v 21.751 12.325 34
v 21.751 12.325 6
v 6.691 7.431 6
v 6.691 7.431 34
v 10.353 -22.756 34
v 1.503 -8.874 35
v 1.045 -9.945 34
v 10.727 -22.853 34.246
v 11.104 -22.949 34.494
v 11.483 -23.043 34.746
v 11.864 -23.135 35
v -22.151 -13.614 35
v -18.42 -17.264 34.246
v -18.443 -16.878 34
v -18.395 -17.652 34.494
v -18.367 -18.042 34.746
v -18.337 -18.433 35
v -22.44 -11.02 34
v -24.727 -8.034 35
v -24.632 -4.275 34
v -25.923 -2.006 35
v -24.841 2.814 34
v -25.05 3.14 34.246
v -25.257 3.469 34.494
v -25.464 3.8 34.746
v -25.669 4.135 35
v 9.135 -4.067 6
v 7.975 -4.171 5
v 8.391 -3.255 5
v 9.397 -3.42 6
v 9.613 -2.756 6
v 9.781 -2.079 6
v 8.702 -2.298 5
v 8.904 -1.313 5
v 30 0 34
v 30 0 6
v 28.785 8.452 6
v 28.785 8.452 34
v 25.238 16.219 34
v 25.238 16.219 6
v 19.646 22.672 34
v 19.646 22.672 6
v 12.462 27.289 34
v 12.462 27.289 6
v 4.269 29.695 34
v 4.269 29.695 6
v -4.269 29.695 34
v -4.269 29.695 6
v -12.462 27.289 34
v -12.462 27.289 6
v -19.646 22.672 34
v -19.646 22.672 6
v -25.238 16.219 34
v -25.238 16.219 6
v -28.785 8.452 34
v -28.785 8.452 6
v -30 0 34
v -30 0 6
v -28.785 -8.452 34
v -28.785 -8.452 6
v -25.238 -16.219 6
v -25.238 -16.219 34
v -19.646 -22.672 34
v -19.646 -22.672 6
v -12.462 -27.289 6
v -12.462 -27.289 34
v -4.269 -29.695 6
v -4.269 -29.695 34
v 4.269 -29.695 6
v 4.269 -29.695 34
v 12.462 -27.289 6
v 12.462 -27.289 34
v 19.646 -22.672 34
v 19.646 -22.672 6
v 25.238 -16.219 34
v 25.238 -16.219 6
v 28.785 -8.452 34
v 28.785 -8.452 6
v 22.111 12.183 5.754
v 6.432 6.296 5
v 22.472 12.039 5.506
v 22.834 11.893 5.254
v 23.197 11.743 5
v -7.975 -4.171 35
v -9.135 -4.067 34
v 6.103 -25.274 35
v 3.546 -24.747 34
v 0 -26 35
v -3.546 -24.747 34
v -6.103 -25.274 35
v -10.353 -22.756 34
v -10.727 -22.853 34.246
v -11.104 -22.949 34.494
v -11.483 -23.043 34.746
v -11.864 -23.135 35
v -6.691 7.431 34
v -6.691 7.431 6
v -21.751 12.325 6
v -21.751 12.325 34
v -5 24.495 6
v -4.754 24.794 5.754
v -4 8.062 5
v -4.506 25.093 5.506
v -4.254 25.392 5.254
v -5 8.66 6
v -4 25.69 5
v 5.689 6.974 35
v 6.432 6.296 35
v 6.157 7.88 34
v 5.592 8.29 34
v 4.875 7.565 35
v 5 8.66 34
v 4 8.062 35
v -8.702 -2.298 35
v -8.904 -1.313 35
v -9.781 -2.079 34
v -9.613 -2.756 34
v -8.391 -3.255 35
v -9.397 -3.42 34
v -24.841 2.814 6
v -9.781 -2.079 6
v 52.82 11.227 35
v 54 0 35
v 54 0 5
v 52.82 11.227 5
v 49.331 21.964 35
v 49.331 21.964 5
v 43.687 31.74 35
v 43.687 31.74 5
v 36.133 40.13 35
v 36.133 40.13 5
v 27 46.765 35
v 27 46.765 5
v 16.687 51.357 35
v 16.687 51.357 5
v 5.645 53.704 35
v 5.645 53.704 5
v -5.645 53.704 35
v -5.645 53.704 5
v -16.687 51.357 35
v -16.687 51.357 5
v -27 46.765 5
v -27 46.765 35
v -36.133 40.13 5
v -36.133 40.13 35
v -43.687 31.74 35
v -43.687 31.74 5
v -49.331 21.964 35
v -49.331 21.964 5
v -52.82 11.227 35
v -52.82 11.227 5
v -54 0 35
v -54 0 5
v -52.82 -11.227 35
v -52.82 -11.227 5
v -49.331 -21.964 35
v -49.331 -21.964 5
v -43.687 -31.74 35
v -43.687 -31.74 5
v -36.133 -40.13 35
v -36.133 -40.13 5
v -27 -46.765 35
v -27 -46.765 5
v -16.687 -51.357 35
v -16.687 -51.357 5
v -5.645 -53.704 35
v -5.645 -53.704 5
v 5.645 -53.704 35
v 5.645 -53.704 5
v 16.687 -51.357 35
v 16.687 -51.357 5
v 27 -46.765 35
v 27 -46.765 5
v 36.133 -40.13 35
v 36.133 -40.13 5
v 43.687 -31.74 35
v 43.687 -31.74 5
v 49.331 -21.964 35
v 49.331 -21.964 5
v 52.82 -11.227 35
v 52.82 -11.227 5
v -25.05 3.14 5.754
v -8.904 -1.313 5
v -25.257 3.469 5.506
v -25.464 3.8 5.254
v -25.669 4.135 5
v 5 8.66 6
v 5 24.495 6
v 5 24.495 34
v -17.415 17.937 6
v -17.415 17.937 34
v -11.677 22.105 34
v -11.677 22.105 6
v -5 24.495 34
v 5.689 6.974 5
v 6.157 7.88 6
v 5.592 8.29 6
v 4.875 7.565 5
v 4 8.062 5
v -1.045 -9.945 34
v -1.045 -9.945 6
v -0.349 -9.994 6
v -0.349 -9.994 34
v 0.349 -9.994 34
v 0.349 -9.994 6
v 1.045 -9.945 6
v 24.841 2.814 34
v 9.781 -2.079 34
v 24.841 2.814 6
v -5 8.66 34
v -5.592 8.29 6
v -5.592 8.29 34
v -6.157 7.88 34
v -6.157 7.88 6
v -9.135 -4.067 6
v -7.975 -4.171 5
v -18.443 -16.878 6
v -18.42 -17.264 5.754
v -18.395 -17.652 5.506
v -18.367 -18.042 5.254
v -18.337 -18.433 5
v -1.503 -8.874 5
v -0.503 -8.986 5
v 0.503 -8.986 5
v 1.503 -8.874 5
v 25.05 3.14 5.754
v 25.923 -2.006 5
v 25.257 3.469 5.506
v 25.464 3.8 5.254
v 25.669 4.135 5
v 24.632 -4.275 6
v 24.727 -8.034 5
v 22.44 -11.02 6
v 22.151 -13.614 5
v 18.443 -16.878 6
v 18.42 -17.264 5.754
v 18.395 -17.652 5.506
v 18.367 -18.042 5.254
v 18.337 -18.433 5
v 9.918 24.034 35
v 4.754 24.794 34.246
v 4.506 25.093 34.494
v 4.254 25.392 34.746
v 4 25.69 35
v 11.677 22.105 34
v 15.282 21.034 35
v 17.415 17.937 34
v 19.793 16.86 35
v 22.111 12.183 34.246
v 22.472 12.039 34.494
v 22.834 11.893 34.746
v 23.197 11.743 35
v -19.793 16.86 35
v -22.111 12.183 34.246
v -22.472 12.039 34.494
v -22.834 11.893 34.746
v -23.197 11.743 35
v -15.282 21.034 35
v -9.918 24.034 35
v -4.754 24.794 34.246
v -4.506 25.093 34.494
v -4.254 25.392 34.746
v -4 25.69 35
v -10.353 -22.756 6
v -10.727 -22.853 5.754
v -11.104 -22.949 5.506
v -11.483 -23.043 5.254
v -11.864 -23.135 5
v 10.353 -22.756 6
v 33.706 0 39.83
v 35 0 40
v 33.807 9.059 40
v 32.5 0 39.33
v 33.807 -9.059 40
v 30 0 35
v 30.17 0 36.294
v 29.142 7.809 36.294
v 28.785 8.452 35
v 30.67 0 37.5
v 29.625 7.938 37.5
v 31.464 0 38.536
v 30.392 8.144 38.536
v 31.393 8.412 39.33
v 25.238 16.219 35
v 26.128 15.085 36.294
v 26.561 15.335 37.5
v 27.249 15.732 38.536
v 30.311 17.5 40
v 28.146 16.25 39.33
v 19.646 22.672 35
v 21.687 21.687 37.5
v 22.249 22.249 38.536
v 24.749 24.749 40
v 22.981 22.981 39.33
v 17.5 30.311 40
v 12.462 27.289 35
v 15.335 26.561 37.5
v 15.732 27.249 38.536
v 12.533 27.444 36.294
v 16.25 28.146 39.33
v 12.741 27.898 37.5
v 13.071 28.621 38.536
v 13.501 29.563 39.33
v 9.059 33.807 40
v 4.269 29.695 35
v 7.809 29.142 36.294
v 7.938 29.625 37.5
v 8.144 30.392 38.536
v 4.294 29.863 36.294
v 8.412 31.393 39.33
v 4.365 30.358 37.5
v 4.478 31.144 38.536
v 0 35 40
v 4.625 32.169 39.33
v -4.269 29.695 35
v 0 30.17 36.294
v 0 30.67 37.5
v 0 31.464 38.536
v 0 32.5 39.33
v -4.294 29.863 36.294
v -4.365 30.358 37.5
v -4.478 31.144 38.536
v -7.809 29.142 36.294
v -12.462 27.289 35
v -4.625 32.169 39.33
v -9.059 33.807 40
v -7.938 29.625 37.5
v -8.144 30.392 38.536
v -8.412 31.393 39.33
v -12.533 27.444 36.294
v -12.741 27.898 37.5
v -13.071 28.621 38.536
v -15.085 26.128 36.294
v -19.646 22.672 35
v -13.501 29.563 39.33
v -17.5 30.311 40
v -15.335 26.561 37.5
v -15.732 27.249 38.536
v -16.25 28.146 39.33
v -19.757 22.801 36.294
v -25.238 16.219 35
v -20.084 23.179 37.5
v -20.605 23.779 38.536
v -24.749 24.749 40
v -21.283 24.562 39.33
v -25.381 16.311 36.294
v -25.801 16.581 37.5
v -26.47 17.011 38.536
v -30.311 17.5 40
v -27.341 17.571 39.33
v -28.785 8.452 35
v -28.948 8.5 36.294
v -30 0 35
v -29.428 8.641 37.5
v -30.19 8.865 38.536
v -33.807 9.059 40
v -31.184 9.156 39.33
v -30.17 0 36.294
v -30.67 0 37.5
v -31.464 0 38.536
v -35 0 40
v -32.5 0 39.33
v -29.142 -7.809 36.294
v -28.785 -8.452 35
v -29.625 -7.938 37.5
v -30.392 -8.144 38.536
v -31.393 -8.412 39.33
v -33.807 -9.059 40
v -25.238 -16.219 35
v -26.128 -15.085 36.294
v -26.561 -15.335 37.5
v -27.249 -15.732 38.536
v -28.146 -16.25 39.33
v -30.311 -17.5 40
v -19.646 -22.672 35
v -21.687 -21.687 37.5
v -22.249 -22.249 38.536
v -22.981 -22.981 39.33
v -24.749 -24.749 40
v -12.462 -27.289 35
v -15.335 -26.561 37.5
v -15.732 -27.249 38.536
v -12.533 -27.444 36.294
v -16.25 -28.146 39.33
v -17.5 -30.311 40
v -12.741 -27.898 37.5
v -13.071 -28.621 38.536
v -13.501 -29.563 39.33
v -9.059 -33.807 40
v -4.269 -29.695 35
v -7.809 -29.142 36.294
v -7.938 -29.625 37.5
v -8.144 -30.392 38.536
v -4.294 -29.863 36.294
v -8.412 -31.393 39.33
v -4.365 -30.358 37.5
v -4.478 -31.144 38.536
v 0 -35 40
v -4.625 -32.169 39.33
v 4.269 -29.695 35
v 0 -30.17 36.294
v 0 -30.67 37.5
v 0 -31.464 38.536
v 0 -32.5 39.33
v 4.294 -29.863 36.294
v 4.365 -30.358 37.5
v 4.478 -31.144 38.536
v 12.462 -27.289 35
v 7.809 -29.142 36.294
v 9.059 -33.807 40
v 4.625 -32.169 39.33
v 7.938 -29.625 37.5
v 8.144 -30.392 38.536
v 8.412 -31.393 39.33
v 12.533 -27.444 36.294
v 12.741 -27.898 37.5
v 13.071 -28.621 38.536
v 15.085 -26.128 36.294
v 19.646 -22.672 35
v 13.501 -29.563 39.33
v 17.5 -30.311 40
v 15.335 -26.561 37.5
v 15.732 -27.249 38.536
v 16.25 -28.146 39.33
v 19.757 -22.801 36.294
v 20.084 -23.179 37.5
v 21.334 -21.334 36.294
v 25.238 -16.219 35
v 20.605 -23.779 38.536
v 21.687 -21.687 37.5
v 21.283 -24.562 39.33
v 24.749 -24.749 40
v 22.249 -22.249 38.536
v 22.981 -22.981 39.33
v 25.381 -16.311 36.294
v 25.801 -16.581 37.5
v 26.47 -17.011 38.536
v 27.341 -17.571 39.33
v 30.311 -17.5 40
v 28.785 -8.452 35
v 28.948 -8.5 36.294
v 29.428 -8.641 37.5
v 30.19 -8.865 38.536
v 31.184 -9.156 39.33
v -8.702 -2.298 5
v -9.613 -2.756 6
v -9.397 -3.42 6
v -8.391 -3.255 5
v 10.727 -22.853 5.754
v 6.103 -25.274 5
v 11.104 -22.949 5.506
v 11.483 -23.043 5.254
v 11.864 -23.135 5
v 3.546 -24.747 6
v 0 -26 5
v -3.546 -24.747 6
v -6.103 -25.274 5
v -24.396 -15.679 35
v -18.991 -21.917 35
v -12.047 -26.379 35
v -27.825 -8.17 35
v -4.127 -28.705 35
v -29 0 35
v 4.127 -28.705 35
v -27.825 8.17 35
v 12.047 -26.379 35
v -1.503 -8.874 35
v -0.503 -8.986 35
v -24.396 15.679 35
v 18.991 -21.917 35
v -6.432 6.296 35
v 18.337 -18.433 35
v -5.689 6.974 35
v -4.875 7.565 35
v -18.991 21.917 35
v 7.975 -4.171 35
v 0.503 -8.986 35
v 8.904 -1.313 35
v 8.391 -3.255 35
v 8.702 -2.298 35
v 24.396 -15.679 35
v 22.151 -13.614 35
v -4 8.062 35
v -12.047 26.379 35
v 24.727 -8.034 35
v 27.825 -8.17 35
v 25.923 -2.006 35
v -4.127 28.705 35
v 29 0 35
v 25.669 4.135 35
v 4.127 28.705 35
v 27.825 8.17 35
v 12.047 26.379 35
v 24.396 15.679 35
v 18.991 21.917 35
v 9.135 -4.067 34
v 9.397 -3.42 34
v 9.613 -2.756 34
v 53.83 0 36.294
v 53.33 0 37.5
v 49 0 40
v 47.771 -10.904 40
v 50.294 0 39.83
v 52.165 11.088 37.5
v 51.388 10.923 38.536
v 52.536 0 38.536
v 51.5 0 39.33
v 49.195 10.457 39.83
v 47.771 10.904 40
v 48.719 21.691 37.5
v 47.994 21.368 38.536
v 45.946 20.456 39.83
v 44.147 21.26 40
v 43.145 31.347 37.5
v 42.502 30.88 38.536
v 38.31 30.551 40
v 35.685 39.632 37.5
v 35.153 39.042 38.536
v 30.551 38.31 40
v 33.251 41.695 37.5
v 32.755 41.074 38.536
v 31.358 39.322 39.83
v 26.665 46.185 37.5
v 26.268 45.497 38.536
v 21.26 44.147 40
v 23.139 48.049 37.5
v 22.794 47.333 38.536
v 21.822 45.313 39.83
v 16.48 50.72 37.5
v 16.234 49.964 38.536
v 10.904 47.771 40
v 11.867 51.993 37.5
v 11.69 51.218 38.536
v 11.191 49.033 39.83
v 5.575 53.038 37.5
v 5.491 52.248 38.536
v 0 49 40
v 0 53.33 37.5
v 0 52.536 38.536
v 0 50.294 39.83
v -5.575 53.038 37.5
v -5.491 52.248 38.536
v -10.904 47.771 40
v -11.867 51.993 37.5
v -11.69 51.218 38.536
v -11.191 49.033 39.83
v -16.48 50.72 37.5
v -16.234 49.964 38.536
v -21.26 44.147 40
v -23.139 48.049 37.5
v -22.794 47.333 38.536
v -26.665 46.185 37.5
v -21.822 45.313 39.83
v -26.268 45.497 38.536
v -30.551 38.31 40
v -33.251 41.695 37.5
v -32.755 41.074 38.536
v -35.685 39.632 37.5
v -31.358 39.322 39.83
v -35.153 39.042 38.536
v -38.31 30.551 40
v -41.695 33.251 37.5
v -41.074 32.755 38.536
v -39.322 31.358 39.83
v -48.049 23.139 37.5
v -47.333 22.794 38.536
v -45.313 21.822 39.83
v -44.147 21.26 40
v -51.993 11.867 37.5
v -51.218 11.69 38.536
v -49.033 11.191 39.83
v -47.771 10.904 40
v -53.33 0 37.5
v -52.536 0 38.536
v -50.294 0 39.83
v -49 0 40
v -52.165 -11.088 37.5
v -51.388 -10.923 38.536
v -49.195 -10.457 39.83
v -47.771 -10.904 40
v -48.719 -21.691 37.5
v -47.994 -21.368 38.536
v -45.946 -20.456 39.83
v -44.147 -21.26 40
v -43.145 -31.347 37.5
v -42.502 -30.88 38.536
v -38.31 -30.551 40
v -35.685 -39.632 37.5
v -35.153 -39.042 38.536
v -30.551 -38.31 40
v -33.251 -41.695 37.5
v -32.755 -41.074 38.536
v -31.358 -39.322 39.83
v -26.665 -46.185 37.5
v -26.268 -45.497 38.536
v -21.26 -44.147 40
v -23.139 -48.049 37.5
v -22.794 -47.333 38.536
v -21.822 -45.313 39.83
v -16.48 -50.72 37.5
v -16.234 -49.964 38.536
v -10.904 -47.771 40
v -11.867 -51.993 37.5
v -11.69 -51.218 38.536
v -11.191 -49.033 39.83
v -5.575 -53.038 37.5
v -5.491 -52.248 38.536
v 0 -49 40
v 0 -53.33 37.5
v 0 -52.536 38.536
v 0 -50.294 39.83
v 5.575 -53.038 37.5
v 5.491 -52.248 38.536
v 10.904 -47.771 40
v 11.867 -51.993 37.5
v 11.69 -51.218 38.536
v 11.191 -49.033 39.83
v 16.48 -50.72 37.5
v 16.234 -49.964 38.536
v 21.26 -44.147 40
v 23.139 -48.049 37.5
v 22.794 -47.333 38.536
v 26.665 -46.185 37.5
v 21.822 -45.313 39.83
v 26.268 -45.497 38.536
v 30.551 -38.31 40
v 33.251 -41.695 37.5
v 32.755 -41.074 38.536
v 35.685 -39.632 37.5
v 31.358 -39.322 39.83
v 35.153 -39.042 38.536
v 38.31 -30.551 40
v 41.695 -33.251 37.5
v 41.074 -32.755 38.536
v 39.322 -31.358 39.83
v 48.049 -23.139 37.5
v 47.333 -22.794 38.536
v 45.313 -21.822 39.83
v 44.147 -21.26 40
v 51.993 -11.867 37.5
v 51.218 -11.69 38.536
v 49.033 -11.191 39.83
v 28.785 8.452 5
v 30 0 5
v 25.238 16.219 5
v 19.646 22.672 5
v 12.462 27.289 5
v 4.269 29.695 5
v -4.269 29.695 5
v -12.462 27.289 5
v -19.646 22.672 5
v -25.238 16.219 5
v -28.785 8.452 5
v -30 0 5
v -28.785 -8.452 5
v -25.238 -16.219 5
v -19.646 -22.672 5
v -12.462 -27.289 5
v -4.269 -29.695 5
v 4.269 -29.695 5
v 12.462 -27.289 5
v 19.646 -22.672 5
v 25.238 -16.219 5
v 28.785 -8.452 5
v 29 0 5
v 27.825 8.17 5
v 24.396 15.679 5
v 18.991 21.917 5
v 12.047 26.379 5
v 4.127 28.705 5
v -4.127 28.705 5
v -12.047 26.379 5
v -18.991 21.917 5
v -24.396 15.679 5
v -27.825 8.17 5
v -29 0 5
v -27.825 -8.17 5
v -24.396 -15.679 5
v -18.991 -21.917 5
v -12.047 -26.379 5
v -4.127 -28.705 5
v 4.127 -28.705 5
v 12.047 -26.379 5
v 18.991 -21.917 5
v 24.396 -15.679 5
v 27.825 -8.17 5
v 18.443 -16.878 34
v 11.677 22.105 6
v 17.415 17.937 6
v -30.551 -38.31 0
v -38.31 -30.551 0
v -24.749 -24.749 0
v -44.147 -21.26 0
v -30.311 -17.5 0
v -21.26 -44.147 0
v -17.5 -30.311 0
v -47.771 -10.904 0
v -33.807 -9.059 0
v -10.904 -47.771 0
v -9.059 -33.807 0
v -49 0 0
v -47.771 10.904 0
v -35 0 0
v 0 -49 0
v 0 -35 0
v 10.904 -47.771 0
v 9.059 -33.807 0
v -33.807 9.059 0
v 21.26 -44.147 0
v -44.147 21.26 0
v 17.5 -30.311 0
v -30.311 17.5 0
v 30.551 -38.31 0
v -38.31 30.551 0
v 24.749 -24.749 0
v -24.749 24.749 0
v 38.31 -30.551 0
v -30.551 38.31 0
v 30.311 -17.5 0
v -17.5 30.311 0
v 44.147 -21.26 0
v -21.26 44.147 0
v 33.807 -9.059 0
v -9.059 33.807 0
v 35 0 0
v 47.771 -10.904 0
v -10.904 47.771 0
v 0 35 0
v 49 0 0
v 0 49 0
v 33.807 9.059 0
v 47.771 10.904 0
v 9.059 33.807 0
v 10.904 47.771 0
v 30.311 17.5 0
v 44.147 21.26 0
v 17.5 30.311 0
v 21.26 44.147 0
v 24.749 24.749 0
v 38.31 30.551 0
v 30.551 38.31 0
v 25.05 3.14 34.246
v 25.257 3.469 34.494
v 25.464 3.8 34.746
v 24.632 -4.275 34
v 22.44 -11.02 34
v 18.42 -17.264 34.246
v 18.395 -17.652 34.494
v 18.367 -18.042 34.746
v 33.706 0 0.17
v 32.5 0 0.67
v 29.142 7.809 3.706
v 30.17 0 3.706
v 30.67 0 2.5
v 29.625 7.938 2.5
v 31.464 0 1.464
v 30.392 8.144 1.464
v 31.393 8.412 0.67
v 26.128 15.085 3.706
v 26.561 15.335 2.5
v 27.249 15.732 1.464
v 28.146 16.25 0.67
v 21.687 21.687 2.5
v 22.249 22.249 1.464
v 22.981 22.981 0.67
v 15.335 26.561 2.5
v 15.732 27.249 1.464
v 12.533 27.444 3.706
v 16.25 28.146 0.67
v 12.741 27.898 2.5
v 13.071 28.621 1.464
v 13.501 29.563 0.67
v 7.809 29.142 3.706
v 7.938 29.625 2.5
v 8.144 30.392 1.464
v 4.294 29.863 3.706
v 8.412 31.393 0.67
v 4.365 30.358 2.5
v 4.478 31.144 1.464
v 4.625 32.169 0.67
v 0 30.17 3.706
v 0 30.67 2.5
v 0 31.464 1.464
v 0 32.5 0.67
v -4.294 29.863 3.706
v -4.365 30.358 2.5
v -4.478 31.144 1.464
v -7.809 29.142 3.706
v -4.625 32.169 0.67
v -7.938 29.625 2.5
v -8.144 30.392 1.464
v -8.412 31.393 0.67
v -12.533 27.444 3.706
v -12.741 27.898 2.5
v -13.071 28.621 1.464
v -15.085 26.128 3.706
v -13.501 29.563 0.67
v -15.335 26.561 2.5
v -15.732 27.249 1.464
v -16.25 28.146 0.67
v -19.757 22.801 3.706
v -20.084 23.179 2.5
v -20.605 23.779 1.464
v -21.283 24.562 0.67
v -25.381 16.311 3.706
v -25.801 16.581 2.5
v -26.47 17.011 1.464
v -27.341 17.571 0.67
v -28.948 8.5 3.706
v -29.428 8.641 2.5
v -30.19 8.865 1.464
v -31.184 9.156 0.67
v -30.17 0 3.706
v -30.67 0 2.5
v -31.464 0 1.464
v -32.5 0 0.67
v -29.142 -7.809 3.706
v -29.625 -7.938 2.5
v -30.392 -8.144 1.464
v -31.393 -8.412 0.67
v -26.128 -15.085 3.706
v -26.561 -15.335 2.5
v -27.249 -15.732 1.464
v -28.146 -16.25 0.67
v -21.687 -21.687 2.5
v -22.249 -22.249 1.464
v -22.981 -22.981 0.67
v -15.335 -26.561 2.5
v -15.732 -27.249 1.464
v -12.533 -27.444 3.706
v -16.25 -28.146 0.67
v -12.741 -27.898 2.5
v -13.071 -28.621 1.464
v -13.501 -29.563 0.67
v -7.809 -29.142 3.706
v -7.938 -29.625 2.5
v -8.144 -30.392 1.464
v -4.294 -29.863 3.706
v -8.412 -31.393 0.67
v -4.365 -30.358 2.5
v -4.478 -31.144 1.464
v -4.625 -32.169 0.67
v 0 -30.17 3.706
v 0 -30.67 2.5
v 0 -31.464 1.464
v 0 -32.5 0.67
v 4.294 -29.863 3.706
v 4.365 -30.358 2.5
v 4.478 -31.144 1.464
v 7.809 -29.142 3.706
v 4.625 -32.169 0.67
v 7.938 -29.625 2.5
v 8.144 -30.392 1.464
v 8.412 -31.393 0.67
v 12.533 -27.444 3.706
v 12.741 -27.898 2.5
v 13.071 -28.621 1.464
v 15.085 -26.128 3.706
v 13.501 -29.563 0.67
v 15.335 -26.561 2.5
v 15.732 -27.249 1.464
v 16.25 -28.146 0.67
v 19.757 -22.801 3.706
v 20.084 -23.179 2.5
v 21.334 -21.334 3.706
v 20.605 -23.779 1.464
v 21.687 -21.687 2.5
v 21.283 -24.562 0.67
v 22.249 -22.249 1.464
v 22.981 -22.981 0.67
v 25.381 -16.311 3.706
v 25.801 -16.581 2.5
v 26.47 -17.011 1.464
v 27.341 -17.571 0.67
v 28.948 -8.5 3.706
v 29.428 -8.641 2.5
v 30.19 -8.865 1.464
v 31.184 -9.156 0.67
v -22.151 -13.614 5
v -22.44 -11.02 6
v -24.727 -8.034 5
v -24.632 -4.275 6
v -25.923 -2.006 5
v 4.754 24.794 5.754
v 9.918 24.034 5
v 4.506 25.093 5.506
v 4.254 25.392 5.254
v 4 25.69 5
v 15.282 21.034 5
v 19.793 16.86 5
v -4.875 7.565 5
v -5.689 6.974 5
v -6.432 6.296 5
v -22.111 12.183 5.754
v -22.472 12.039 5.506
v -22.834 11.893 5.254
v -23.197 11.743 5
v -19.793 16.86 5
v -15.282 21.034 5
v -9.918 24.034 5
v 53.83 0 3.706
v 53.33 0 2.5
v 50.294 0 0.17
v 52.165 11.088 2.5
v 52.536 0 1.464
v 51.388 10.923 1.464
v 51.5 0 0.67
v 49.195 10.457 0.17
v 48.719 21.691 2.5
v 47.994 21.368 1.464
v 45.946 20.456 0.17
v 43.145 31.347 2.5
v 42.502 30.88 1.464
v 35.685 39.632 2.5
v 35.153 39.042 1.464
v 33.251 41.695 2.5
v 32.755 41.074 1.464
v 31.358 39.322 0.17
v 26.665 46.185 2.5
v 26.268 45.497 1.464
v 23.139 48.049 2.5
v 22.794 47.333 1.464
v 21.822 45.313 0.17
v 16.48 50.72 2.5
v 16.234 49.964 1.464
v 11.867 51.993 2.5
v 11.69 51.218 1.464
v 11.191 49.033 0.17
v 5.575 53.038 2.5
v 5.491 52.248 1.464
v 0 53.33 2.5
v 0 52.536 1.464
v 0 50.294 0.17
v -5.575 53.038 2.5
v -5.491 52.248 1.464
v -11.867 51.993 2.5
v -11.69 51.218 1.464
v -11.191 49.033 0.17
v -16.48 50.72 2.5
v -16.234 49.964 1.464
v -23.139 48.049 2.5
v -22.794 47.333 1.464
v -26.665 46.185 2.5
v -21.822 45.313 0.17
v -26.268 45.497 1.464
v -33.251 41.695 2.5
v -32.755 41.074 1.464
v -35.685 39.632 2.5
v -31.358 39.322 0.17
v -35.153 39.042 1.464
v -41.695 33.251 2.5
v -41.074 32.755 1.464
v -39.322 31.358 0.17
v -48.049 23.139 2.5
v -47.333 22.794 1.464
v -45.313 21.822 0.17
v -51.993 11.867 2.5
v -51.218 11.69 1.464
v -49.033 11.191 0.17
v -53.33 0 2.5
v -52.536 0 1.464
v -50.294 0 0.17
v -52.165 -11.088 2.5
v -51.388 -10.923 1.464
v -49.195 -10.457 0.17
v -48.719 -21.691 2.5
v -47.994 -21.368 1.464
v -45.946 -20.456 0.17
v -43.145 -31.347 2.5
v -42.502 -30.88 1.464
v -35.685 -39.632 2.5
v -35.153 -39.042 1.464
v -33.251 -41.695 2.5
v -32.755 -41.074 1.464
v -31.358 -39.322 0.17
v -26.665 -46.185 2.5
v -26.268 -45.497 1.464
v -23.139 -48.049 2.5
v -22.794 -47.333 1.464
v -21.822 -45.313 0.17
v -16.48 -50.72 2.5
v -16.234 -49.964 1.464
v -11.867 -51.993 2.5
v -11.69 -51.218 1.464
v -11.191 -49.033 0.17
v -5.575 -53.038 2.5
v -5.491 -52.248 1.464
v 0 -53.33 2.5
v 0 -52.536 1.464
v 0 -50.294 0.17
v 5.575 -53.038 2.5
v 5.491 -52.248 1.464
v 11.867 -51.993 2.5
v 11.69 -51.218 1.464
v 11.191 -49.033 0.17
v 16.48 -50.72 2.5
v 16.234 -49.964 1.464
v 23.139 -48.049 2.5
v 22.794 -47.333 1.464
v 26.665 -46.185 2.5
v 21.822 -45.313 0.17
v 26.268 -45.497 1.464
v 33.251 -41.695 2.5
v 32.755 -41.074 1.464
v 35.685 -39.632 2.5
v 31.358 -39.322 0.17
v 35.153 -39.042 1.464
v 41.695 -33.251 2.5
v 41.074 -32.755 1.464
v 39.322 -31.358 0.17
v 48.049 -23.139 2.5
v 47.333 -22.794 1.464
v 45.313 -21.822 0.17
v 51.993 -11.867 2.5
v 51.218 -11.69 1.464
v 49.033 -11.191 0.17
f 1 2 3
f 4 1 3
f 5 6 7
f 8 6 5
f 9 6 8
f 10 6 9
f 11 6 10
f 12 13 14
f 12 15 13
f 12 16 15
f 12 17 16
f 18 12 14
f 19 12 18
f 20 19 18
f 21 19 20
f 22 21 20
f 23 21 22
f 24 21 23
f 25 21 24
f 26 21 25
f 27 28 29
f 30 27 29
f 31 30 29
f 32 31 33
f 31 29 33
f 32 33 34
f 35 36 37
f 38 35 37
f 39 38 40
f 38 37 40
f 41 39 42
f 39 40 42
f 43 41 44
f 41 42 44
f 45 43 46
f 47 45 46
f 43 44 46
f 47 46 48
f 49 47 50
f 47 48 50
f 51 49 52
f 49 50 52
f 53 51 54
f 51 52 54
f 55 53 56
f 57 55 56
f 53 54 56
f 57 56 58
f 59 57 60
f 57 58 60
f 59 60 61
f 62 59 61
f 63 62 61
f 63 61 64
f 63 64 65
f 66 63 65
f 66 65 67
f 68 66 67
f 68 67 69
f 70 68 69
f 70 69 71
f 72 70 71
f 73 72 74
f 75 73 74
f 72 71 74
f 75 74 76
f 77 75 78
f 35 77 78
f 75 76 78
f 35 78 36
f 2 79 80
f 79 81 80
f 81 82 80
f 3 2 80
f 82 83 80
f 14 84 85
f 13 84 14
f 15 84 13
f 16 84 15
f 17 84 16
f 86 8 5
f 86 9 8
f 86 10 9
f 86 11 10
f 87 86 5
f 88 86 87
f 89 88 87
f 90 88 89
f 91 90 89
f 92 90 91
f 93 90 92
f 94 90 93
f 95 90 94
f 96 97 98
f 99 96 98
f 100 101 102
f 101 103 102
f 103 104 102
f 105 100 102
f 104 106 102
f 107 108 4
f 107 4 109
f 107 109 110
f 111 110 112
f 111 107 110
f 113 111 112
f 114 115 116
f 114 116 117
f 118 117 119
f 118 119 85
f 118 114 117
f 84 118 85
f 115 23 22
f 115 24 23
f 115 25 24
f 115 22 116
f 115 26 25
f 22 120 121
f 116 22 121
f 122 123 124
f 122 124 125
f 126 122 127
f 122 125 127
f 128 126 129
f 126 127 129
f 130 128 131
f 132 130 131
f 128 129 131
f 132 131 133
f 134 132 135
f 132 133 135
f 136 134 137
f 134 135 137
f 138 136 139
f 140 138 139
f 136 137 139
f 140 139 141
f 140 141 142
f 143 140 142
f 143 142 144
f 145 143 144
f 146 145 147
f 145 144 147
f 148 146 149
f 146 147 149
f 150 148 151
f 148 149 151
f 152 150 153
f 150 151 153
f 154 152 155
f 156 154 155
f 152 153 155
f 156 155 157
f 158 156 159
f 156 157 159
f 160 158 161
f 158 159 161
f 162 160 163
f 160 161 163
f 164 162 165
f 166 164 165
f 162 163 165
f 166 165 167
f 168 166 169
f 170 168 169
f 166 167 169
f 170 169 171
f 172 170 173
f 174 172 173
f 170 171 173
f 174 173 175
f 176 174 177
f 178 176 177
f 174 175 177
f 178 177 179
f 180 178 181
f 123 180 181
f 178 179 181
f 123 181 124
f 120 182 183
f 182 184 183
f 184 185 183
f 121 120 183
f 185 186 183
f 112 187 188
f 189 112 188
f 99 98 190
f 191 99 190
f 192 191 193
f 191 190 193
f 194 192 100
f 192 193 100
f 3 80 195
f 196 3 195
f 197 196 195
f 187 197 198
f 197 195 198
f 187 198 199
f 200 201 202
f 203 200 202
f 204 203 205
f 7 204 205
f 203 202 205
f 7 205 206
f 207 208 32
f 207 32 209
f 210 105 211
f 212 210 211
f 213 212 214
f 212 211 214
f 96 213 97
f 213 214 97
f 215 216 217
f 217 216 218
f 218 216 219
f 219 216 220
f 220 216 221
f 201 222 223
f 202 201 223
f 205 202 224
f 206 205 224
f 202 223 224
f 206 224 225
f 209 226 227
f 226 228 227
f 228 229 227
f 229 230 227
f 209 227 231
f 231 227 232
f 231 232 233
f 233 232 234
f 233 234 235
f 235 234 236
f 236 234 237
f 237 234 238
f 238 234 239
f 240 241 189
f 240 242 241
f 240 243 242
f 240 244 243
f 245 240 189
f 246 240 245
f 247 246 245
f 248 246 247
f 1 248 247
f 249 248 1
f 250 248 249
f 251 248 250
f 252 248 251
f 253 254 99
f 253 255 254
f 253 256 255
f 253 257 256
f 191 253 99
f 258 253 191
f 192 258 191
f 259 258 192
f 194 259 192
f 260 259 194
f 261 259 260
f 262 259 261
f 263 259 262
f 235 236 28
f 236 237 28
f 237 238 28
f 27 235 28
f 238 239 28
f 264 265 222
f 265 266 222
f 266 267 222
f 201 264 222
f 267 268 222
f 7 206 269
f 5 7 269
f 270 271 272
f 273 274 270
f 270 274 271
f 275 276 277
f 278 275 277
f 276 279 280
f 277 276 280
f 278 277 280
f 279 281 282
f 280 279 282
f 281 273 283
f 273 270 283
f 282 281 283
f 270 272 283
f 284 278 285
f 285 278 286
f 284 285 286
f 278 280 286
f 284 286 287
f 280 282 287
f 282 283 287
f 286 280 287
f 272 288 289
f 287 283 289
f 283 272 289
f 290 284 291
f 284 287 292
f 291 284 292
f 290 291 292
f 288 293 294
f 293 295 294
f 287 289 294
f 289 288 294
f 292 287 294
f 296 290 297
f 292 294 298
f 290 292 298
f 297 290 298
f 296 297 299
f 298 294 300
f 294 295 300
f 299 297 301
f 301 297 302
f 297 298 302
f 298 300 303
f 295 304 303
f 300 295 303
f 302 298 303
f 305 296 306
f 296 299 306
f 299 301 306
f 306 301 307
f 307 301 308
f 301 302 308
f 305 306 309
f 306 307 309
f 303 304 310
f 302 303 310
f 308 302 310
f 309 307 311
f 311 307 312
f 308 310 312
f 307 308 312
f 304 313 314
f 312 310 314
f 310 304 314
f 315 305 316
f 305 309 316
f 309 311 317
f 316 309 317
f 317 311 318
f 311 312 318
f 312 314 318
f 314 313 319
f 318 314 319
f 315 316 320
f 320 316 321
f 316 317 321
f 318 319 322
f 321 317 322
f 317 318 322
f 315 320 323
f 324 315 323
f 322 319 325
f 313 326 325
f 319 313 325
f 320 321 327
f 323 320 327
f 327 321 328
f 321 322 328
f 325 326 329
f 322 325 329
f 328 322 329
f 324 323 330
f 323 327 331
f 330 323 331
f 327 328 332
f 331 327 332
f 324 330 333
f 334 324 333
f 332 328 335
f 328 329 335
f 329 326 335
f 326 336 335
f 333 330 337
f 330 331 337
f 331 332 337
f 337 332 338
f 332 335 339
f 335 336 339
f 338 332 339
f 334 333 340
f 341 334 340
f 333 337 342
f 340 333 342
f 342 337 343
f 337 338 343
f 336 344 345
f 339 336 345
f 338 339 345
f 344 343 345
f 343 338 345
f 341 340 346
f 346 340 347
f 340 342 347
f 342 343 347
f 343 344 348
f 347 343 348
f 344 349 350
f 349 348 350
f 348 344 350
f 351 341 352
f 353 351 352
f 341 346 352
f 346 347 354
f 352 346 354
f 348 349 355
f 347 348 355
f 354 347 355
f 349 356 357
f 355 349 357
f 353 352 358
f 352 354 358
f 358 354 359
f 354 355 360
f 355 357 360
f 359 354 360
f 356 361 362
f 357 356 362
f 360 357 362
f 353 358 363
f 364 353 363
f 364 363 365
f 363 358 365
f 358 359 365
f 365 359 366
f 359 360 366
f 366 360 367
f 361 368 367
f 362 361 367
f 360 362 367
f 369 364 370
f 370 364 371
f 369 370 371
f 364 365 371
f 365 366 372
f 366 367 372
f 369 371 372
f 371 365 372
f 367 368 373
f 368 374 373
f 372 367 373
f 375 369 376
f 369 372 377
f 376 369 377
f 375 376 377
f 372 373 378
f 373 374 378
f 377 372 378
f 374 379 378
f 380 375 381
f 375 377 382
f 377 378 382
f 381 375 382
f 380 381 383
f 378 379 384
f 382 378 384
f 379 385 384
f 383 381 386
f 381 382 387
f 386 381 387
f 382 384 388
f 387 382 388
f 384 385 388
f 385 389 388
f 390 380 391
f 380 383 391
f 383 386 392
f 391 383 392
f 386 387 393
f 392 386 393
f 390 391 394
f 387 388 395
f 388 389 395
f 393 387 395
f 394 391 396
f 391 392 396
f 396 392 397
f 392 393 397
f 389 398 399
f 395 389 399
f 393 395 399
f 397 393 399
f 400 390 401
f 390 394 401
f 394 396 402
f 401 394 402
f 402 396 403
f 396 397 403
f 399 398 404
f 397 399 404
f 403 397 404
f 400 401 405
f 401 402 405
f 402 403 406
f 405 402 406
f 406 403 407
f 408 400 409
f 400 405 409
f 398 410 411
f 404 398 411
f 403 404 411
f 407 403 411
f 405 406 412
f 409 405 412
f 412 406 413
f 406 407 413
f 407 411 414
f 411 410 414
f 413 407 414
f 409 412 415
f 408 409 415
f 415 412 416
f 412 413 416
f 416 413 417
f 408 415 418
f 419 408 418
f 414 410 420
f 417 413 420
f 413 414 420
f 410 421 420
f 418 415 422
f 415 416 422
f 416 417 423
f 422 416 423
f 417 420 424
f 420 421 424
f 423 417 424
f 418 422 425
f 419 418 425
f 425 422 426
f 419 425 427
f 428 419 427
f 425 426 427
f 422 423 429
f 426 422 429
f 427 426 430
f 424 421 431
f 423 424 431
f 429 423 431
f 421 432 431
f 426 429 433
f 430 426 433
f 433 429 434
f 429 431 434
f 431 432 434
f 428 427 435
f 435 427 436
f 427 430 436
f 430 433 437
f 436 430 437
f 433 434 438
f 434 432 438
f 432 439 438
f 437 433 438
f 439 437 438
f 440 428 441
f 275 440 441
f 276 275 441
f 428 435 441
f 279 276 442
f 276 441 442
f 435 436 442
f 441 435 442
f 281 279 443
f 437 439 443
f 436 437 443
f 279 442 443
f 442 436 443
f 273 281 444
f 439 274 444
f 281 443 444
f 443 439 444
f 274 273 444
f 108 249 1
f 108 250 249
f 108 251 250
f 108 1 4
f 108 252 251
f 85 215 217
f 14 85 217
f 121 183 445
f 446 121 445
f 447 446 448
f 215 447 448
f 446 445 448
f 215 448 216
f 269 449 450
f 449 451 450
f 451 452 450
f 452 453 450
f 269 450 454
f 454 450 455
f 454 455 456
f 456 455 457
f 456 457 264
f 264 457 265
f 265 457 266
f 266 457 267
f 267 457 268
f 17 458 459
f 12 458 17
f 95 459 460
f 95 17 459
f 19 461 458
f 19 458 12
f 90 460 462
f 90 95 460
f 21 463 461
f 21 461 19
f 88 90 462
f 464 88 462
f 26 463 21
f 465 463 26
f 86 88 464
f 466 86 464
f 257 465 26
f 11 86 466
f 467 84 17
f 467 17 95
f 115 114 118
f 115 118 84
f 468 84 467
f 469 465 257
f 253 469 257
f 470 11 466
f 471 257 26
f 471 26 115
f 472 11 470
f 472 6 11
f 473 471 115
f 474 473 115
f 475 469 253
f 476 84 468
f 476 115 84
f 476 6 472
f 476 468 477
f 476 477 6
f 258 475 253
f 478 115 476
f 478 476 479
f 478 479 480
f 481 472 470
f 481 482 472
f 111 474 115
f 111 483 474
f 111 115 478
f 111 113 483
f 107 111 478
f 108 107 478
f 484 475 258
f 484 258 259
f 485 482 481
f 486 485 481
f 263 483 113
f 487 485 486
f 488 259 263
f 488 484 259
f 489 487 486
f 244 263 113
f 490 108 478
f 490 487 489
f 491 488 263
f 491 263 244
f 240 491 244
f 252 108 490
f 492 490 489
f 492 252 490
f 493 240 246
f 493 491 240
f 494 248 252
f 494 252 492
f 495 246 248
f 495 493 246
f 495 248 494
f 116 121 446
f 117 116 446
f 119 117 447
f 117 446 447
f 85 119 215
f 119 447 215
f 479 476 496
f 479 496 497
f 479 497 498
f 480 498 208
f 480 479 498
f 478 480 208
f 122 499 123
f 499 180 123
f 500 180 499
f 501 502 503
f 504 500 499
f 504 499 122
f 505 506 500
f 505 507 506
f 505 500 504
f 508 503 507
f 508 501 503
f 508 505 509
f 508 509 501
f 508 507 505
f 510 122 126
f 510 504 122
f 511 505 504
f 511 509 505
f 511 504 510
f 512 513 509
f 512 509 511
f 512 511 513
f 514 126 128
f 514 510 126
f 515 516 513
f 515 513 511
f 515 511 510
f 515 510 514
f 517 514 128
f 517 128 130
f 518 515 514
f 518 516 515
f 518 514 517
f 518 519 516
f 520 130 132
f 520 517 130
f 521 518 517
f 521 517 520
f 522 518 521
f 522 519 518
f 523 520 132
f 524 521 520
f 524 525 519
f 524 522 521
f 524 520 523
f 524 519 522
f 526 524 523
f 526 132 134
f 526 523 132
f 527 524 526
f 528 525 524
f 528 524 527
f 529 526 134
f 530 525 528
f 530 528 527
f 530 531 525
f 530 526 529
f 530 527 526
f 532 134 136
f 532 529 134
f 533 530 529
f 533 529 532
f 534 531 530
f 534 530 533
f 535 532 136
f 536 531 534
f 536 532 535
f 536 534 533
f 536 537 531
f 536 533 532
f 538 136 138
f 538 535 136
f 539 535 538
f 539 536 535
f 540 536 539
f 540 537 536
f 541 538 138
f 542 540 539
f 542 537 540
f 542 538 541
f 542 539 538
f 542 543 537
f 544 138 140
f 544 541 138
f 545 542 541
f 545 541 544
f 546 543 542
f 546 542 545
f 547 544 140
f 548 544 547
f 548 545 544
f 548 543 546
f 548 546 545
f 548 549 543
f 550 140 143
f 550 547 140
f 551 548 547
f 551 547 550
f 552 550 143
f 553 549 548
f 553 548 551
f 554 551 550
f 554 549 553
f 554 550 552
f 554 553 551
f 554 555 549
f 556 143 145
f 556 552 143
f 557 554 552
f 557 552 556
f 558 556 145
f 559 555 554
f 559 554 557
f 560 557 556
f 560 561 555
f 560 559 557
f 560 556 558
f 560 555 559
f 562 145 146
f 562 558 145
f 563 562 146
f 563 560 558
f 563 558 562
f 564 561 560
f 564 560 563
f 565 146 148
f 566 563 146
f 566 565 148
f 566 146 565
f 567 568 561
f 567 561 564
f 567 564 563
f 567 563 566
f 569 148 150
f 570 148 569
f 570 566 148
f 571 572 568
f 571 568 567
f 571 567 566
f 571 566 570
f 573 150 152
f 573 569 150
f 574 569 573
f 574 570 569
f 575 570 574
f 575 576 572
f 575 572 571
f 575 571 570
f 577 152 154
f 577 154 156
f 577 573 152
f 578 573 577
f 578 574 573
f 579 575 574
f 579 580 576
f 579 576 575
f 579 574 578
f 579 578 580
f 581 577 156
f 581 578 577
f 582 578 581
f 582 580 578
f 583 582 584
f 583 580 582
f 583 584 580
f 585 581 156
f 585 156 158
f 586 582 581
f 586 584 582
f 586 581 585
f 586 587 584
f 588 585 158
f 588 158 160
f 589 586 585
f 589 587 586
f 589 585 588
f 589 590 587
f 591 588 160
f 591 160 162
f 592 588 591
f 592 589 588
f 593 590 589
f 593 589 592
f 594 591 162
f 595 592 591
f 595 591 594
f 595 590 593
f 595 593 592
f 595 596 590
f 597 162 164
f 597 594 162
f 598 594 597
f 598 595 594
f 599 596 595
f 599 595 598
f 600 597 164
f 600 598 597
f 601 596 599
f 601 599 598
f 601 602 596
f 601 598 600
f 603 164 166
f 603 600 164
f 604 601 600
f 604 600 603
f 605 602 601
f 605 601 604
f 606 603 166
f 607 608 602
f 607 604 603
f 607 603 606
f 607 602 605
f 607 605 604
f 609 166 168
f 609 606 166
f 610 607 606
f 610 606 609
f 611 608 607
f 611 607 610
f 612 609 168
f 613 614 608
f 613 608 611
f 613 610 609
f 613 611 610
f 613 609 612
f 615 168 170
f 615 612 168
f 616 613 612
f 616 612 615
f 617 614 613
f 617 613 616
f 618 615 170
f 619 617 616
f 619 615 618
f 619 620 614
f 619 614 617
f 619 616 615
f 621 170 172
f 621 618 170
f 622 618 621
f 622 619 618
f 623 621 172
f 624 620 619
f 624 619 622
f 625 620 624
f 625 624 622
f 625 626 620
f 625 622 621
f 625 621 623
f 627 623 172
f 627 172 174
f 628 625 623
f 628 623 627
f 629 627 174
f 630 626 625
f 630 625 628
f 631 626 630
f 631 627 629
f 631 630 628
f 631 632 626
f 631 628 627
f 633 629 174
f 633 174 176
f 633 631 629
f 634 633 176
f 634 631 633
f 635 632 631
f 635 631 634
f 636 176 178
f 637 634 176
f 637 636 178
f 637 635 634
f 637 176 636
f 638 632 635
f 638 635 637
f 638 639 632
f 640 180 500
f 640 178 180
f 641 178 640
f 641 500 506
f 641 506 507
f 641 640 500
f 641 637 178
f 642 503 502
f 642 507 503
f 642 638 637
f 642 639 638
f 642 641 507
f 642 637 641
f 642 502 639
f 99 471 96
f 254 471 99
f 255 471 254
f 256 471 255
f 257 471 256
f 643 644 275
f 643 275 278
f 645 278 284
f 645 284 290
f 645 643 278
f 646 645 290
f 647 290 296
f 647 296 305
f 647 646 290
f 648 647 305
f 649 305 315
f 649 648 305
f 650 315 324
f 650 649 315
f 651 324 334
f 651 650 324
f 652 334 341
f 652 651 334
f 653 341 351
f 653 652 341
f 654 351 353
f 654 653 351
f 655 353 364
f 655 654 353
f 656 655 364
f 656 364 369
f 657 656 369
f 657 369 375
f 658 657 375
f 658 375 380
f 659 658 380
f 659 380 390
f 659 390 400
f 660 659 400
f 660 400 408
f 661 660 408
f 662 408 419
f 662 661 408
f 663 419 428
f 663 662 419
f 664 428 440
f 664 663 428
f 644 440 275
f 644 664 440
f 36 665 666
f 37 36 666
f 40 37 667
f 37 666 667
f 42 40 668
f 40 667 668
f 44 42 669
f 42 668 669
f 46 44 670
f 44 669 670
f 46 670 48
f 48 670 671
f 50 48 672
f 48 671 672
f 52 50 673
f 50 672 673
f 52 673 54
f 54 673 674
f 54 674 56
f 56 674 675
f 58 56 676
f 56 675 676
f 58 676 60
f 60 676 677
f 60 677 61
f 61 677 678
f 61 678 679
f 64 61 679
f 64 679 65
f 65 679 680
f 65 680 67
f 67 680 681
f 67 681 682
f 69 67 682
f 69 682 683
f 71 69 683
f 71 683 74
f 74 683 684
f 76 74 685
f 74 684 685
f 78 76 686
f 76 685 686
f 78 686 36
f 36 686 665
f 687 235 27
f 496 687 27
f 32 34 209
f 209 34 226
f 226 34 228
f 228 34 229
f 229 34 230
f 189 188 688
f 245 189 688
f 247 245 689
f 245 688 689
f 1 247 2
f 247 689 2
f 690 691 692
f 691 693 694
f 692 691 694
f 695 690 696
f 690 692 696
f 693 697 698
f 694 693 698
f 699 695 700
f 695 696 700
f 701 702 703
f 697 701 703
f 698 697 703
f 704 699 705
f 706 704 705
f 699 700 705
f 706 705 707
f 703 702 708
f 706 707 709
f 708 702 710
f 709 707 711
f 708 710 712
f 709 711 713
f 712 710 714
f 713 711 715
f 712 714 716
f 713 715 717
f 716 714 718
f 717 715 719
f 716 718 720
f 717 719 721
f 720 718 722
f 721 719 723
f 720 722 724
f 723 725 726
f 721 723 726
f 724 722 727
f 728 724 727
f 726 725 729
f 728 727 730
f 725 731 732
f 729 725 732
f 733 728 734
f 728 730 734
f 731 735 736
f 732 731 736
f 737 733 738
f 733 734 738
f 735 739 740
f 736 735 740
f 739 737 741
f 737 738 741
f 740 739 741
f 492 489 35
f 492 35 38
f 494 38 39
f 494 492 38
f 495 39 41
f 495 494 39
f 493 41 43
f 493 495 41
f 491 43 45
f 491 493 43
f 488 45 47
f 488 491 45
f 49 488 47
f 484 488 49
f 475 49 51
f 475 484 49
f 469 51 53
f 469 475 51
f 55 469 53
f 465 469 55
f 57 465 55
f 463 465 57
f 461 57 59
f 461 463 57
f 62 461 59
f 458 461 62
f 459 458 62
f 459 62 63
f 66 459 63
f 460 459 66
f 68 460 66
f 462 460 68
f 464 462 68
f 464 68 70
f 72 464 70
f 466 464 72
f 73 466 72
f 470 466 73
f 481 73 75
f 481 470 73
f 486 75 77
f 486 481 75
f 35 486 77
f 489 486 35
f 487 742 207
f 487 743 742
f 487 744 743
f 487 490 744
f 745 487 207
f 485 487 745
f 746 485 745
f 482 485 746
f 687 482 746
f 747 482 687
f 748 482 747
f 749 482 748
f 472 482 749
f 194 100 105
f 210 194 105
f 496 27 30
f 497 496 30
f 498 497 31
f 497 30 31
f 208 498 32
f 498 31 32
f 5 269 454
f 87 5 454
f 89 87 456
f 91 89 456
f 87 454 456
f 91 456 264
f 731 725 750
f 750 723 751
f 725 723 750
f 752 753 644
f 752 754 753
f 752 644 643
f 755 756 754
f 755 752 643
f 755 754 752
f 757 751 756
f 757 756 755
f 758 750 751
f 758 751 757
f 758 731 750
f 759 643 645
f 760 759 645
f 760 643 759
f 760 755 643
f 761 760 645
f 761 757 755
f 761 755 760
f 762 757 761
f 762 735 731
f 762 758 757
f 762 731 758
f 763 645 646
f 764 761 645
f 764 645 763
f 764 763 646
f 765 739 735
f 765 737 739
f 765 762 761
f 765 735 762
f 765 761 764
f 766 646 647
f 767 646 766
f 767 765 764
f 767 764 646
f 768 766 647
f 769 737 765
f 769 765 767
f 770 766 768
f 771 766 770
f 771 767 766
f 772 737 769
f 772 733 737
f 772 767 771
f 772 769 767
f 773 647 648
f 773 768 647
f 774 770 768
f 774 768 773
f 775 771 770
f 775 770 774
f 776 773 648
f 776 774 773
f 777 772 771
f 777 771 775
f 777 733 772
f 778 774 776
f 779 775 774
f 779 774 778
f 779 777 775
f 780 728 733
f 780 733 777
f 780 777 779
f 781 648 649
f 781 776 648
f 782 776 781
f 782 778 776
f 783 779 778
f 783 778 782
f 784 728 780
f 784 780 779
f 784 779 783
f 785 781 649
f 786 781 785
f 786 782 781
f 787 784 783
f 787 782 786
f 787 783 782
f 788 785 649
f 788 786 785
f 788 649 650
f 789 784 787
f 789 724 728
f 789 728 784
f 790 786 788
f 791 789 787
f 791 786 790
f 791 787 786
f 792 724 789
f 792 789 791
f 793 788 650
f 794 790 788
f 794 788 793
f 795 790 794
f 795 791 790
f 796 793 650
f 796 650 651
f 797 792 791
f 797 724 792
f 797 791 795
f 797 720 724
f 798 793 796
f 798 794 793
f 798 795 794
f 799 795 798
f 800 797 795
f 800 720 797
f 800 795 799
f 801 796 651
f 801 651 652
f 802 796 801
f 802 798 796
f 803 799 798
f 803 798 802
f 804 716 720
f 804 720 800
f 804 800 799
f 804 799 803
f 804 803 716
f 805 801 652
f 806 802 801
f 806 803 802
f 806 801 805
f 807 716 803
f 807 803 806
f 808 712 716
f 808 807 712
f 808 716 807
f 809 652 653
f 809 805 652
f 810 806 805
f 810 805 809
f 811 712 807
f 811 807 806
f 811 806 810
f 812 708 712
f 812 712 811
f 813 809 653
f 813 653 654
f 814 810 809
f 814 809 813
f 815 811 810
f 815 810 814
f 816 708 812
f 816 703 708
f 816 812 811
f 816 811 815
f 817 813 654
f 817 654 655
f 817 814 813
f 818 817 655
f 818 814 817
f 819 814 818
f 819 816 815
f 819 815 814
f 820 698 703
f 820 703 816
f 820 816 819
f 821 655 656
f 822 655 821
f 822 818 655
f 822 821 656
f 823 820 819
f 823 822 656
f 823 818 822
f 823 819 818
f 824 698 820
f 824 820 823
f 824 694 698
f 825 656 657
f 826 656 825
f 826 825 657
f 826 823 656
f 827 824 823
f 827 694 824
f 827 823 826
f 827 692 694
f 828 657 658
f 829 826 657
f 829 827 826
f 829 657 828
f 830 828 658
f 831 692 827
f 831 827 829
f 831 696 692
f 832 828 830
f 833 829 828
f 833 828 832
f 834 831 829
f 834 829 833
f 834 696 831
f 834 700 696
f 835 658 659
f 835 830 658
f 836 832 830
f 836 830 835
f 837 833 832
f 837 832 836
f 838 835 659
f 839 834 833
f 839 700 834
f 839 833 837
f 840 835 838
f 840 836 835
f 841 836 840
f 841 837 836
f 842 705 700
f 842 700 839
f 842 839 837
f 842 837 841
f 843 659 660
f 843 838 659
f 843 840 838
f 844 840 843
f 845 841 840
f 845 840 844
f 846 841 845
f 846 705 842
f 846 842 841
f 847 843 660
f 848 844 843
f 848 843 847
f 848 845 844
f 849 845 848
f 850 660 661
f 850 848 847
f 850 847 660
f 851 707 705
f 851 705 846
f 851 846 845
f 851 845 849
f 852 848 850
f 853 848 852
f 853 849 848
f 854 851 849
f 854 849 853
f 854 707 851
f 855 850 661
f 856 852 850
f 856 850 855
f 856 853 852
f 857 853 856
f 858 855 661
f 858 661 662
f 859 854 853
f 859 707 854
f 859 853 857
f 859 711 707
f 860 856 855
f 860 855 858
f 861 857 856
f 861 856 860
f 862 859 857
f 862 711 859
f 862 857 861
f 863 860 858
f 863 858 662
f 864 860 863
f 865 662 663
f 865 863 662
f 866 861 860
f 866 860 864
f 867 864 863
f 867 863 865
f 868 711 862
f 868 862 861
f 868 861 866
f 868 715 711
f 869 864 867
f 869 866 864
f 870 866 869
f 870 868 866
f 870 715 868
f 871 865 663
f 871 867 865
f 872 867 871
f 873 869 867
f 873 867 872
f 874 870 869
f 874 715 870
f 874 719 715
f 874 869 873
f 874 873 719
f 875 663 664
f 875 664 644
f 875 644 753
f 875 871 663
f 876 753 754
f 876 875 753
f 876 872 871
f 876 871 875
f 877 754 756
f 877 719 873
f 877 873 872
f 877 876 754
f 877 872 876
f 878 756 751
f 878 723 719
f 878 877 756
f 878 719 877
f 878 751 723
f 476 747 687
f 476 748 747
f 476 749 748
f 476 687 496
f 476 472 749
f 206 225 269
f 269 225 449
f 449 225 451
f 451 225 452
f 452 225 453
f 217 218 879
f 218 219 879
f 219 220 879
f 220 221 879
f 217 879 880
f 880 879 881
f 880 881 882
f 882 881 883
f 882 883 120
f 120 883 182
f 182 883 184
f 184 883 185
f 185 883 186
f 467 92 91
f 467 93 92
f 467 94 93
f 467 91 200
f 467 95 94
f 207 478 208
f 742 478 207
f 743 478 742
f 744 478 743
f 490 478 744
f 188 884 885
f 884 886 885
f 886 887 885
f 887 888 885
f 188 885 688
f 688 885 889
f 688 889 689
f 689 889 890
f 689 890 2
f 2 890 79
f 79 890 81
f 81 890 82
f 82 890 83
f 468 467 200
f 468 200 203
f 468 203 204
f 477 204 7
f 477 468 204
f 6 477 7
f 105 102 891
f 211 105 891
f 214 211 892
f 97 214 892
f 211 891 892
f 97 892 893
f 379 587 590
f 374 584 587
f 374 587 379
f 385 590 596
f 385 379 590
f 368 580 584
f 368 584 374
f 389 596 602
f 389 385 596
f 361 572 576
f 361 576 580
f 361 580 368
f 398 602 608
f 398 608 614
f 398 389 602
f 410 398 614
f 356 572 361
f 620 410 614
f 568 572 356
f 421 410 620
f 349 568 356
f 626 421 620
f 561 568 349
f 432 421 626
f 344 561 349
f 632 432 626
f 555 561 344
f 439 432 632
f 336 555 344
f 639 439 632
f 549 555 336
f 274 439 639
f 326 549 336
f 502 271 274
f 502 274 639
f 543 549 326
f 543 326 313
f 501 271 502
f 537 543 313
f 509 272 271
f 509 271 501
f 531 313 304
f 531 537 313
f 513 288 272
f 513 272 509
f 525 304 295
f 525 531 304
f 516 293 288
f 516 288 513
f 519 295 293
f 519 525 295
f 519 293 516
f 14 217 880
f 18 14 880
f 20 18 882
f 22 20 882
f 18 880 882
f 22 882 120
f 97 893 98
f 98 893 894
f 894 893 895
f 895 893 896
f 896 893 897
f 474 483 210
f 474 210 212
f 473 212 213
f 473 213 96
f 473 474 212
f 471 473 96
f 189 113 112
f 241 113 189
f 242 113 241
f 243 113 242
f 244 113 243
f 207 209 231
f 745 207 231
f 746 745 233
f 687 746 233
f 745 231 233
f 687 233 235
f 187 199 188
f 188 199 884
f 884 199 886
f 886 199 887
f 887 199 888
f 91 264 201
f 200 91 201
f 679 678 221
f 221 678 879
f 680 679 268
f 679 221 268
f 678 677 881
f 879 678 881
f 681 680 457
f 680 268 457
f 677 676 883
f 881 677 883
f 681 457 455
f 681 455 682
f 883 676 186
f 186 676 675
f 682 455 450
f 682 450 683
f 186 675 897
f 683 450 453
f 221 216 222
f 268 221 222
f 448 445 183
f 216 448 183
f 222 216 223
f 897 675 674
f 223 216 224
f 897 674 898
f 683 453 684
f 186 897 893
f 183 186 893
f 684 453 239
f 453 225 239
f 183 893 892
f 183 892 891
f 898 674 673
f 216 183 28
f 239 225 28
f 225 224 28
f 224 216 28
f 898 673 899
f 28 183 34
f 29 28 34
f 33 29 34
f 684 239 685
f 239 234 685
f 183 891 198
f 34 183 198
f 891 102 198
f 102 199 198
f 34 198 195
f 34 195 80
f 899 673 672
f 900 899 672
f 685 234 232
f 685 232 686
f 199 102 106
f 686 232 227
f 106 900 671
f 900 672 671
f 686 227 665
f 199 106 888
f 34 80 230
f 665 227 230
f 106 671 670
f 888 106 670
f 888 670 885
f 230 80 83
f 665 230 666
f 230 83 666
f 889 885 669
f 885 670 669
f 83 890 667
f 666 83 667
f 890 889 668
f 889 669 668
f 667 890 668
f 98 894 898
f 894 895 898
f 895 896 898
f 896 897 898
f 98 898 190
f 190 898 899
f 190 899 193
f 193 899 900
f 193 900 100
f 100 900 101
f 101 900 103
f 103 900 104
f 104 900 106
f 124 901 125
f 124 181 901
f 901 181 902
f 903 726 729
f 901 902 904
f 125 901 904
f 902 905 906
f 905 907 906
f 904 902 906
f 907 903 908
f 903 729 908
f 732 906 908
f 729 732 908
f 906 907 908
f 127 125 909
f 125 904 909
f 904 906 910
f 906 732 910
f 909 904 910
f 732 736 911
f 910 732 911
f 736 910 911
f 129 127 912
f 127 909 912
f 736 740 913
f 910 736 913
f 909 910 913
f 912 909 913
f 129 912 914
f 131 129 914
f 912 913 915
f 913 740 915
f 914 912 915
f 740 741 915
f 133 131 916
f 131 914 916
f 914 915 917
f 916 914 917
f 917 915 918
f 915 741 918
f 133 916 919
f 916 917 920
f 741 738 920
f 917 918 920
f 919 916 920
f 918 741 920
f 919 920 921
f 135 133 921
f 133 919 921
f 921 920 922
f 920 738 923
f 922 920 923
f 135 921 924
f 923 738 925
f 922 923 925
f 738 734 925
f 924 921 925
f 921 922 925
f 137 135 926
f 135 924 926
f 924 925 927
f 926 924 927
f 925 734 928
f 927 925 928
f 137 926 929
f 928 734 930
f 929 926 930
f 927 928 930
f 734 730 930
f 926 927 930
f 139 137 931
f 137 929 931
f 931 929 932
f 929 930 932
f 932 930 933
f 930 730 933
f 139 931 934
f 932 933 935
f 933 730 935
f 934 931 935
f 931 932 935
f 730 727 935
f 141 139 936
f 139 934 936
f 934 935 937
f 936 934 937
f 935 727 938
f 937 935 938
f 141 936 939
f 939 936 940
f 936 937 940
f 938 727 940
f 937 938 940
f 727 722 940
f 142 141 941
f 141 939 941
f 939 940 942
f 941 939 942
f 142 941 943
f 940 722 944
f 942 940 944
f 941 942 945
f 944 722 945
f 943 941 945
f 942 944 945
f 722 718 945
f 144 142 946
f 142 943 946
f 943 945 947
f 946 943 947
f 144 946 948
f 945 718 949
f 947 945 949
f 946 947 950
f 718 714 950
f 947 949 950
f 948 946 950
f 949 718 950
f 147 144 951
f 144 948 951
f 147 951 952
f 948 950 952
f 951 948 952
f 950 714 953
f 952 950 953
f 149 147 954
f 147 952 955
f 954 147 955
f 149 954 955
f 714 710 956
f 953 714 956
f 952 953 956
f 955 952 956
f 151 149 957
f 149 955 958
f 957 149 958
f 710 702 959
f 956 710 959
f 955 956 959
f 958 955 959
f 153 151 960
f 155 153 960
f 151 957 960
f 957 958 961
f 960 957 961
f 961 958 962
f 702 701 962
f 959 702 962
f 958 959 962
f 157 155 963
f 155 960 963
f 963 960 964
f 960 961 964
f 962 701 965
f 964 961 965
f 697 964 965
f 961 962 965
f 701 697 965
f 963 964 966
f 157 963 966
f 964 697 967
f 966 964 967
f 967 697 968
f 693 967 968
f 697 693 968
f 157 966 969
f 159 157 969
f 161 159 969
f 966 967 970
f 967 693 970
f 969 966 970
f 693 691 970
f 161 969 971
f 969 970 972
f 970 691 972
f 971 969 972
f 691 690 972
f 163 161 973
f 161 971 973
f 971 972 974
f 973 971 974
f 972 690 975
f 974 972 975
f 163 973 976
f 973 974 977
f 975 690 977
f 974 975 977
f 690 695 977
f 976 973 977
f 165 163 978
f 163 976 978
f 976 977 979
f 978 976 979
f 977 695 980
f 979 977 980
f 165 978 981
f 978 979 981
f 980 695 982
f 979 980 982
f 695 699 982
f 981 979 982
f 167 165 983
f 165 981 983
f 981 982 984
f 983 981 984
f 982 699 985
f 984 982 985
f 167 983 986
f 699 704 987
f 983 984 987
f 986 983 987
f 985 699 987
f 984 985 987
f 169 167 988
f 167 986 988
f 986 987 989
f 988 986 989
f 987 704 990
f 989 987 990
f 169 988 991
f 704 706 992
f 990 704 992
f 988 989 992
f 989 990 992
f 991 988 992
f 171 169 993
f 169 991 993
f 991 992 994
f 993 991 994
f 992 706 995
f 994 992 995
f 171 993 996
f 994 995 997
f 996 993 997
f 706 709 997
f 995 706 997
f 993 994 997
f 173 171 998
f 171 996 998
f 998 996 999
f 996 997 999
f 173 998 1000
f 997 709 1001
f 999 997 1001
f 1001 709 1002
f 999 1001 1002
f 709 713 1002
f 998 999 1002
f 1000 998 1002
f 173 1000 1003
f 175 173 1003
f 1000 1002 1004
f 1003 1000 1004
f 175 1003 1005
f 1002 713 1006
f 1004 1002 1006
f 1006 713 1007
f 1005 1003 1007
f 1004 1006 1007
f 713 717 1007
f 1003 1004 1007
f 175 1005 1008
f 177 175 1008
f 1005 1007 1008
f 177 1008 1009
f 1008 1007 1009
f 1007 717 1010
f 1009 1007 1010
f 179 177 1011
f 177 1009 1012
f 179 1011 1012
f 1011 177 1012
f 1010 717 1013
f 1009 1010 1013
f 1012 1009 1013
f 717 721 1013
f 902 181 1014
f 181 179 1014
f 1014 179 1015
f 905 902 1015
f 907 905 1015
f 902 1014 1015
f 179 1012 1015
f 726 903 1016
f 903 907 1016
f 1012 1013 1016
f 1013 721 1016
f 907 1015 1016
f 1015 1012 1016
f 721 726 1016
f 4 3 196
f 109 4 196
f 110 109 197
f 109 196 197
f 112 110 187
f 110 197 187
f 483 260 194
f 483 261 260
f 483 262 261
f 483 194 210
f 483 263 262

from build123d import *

# Parameters (mm, degrees)
F0_R     = 54
F0_R_2   = 30
F1_DEPTH = 40
F2_START = 5
F2_DEPTH = 30
F3_R     = 5
F4_SIZE  = 1


with BuildPart() as f1:
    # F0 (on Top) → F1 (new body)
    with BuildSketch(Plane.XY):
        Circle(F0_R)
        Circle(F0_R_2, mode=Mode.SUBTRACT)
    extrude(amount=F1_DEPTH)

    # F3
    f3_edges = [f1.edges().sort_by_distance(p)[0] for p in [
        (-54, 0, 40),
        (-54, 0, 0),
        (-30, 0, 40),
        (-30, 0, 0),
    ]]
    fillet(f3_edges, radius=F3_R)


with BuildPart() as f2:
    # F0 (on Top) → F2 (new body)
    with BuildSketch(Plane.XY.offset(F2_START)):
        Circle(F0_R_2)
        with BuildLine():
            ThreePointArc((-18.4428244364, -16.8778620331), (-23.7764129074, -7.7254248594), (-24.8411167866, 2.8140569992))
            Line((-24.8411167866, 2.8140569992), (-9.7814760073, -2.0791169082))
            ThreePointArc((-9.7814760073, -2.0791169082), (-9.510565163, -3.0901699437), (-9.1354545764, -4.0673664308))
            Line((-9.1354545764, -4.0673664308), (-18.4428244364, -16.8778620331))
        make_face(mode=Mode.SUBTRACT)
        with BuildLine():
            ThreePointArc((10.3526544926, -22.755714556), (0, -25), (-10.3526544926, -22.755714556))
            Line((-10.3526544926, -22.755714556), (-1.0452846327, -9.9452189537))
            ThreePointArc((-1.0452846327, -9.9452189537), (0, -10), (1.0452846327, -9.9452189537))
            Line((1.0452846327, -9.9452189537), (10.3526544926, -22.755714556))
        make_face(mode=Mode.SUBTRACT)
        with BuildLine():
            Line((18.4428244364, -16.8778620331), (9.1354545764, -4.0673664308))
            ThreePointArc((9.1354545764, -4.0673664308), (9.510565163, -3.0901699437), (9.7814760073, -2.0791169082))
            Line((9.7814760073, -2.0791169082), (24.8411167866, 2.8140569992))
            ThreePointArc((24.8411167866, 2.8140569992), (23.7764129074, -7.7254248594), (18.4428244364, -16.8778620331))
        make_face(mode=Mode.SUBTRACT)
        with BuildLine():
            Line((-5, 24.4948974278), (-5, 8.6602540378))
            ThreePointArc((-5, 8.6602540378), (-5.8778525229, 8.0901699437), (-6.6913060636, 7.4314482548))
            Line((-6.6913060636, 7.4314482548), (-21.7509468428, 12.3246221621))
            ThreePointArc((-21.7509468428, 12.3246221621), (-14.6946313073, 20.2254248594), (-5, 24.4948974278))
        make_face(mode=Mode.SUBTRACT)
        with BuildLine():
            ThreePointArc((6.6913060636, 7.4314482548), (5.8778525229, 8.0901699437), (5, 8.6602540378))
            Line((5, 8.6602540378), (5, 24.4948974278))
            ThreePointArc((5, 24.4948974278), (14.6946313073, 20.2254248594), (21.7509468428, 12.3246221621))
            Line((21.7509468428, 12.3246221621), (6.6913060636, 7.4314482548))
        make_face(mode=Mode.SUBTRACT)
    extrude(amount=F2_DEPTH)

    # F4
    f4_edges = [f2.edges().sort_by_distance(p)[0] for p in [
        (-30, 0, 35),
        (-9.510565, -3.09017, 35),
        (-13.78914, -10.472614, 35),
        (-23.776413, -7.725425, 35),
        (-17.311296, 0.36747, 35),
        (0, -25, 35),
        (-5.69897, -16.350467, 35),
        (0, -10, 35),
        (5.69897, -16.350467, 35),
        (23.776413, -7.725425, 35),
        (13.78914, -10.472614, 35),
        (9.510565, -3.09017, 35),
        (17.311296, 0.36747, 35),
        (-5, 16.577576, 35),
        (-5.877853, 8.09017, 35),
        (-14.221126, 9.878035, 35),
        (-14.694631, 20.225425, 35),
        (14.221126, 9.878035, 35),
        (5.877853, 8.09017, 35),
        (5, 16.577576, 35),
        (14.694631, 20.225425, 35),
        (-30, 0, 5),
        (-9.510565, -3.09017, 5),
        (-13.78914, -10.472614, 5),
        (-23.776413, -7.725425, 5),
        (-17.311296, 0.36747, 5),
        (0, -25, 5),
        (-5.69897, -16.350467, 5),
        (0, -10, 5),
        (5.69897, -16.350467, 5),
        (23.776413, -7.725425, 5),
        (13.78914, -10.472614, 5),
        (9.510565, -3.09017, 5),
        (17.311296, 0.36747, 5),
        (-5, 16.577576, 5),
        (-5.877853, 8.09017, 5),
        (-14.221126, 9.878035, 5),
        (-14.694631, 20.225425, 5),
        (14.221126, 9.878035, 5),
        (5.877853, 8.09017, 5),
        (5, 16.577576, 5),
        (14.694631, 20.225425, 5),
    ]]
    chamfer(f4_edges, length=F4_SIZE)


solid = Compound([f1.part, f2.part])
